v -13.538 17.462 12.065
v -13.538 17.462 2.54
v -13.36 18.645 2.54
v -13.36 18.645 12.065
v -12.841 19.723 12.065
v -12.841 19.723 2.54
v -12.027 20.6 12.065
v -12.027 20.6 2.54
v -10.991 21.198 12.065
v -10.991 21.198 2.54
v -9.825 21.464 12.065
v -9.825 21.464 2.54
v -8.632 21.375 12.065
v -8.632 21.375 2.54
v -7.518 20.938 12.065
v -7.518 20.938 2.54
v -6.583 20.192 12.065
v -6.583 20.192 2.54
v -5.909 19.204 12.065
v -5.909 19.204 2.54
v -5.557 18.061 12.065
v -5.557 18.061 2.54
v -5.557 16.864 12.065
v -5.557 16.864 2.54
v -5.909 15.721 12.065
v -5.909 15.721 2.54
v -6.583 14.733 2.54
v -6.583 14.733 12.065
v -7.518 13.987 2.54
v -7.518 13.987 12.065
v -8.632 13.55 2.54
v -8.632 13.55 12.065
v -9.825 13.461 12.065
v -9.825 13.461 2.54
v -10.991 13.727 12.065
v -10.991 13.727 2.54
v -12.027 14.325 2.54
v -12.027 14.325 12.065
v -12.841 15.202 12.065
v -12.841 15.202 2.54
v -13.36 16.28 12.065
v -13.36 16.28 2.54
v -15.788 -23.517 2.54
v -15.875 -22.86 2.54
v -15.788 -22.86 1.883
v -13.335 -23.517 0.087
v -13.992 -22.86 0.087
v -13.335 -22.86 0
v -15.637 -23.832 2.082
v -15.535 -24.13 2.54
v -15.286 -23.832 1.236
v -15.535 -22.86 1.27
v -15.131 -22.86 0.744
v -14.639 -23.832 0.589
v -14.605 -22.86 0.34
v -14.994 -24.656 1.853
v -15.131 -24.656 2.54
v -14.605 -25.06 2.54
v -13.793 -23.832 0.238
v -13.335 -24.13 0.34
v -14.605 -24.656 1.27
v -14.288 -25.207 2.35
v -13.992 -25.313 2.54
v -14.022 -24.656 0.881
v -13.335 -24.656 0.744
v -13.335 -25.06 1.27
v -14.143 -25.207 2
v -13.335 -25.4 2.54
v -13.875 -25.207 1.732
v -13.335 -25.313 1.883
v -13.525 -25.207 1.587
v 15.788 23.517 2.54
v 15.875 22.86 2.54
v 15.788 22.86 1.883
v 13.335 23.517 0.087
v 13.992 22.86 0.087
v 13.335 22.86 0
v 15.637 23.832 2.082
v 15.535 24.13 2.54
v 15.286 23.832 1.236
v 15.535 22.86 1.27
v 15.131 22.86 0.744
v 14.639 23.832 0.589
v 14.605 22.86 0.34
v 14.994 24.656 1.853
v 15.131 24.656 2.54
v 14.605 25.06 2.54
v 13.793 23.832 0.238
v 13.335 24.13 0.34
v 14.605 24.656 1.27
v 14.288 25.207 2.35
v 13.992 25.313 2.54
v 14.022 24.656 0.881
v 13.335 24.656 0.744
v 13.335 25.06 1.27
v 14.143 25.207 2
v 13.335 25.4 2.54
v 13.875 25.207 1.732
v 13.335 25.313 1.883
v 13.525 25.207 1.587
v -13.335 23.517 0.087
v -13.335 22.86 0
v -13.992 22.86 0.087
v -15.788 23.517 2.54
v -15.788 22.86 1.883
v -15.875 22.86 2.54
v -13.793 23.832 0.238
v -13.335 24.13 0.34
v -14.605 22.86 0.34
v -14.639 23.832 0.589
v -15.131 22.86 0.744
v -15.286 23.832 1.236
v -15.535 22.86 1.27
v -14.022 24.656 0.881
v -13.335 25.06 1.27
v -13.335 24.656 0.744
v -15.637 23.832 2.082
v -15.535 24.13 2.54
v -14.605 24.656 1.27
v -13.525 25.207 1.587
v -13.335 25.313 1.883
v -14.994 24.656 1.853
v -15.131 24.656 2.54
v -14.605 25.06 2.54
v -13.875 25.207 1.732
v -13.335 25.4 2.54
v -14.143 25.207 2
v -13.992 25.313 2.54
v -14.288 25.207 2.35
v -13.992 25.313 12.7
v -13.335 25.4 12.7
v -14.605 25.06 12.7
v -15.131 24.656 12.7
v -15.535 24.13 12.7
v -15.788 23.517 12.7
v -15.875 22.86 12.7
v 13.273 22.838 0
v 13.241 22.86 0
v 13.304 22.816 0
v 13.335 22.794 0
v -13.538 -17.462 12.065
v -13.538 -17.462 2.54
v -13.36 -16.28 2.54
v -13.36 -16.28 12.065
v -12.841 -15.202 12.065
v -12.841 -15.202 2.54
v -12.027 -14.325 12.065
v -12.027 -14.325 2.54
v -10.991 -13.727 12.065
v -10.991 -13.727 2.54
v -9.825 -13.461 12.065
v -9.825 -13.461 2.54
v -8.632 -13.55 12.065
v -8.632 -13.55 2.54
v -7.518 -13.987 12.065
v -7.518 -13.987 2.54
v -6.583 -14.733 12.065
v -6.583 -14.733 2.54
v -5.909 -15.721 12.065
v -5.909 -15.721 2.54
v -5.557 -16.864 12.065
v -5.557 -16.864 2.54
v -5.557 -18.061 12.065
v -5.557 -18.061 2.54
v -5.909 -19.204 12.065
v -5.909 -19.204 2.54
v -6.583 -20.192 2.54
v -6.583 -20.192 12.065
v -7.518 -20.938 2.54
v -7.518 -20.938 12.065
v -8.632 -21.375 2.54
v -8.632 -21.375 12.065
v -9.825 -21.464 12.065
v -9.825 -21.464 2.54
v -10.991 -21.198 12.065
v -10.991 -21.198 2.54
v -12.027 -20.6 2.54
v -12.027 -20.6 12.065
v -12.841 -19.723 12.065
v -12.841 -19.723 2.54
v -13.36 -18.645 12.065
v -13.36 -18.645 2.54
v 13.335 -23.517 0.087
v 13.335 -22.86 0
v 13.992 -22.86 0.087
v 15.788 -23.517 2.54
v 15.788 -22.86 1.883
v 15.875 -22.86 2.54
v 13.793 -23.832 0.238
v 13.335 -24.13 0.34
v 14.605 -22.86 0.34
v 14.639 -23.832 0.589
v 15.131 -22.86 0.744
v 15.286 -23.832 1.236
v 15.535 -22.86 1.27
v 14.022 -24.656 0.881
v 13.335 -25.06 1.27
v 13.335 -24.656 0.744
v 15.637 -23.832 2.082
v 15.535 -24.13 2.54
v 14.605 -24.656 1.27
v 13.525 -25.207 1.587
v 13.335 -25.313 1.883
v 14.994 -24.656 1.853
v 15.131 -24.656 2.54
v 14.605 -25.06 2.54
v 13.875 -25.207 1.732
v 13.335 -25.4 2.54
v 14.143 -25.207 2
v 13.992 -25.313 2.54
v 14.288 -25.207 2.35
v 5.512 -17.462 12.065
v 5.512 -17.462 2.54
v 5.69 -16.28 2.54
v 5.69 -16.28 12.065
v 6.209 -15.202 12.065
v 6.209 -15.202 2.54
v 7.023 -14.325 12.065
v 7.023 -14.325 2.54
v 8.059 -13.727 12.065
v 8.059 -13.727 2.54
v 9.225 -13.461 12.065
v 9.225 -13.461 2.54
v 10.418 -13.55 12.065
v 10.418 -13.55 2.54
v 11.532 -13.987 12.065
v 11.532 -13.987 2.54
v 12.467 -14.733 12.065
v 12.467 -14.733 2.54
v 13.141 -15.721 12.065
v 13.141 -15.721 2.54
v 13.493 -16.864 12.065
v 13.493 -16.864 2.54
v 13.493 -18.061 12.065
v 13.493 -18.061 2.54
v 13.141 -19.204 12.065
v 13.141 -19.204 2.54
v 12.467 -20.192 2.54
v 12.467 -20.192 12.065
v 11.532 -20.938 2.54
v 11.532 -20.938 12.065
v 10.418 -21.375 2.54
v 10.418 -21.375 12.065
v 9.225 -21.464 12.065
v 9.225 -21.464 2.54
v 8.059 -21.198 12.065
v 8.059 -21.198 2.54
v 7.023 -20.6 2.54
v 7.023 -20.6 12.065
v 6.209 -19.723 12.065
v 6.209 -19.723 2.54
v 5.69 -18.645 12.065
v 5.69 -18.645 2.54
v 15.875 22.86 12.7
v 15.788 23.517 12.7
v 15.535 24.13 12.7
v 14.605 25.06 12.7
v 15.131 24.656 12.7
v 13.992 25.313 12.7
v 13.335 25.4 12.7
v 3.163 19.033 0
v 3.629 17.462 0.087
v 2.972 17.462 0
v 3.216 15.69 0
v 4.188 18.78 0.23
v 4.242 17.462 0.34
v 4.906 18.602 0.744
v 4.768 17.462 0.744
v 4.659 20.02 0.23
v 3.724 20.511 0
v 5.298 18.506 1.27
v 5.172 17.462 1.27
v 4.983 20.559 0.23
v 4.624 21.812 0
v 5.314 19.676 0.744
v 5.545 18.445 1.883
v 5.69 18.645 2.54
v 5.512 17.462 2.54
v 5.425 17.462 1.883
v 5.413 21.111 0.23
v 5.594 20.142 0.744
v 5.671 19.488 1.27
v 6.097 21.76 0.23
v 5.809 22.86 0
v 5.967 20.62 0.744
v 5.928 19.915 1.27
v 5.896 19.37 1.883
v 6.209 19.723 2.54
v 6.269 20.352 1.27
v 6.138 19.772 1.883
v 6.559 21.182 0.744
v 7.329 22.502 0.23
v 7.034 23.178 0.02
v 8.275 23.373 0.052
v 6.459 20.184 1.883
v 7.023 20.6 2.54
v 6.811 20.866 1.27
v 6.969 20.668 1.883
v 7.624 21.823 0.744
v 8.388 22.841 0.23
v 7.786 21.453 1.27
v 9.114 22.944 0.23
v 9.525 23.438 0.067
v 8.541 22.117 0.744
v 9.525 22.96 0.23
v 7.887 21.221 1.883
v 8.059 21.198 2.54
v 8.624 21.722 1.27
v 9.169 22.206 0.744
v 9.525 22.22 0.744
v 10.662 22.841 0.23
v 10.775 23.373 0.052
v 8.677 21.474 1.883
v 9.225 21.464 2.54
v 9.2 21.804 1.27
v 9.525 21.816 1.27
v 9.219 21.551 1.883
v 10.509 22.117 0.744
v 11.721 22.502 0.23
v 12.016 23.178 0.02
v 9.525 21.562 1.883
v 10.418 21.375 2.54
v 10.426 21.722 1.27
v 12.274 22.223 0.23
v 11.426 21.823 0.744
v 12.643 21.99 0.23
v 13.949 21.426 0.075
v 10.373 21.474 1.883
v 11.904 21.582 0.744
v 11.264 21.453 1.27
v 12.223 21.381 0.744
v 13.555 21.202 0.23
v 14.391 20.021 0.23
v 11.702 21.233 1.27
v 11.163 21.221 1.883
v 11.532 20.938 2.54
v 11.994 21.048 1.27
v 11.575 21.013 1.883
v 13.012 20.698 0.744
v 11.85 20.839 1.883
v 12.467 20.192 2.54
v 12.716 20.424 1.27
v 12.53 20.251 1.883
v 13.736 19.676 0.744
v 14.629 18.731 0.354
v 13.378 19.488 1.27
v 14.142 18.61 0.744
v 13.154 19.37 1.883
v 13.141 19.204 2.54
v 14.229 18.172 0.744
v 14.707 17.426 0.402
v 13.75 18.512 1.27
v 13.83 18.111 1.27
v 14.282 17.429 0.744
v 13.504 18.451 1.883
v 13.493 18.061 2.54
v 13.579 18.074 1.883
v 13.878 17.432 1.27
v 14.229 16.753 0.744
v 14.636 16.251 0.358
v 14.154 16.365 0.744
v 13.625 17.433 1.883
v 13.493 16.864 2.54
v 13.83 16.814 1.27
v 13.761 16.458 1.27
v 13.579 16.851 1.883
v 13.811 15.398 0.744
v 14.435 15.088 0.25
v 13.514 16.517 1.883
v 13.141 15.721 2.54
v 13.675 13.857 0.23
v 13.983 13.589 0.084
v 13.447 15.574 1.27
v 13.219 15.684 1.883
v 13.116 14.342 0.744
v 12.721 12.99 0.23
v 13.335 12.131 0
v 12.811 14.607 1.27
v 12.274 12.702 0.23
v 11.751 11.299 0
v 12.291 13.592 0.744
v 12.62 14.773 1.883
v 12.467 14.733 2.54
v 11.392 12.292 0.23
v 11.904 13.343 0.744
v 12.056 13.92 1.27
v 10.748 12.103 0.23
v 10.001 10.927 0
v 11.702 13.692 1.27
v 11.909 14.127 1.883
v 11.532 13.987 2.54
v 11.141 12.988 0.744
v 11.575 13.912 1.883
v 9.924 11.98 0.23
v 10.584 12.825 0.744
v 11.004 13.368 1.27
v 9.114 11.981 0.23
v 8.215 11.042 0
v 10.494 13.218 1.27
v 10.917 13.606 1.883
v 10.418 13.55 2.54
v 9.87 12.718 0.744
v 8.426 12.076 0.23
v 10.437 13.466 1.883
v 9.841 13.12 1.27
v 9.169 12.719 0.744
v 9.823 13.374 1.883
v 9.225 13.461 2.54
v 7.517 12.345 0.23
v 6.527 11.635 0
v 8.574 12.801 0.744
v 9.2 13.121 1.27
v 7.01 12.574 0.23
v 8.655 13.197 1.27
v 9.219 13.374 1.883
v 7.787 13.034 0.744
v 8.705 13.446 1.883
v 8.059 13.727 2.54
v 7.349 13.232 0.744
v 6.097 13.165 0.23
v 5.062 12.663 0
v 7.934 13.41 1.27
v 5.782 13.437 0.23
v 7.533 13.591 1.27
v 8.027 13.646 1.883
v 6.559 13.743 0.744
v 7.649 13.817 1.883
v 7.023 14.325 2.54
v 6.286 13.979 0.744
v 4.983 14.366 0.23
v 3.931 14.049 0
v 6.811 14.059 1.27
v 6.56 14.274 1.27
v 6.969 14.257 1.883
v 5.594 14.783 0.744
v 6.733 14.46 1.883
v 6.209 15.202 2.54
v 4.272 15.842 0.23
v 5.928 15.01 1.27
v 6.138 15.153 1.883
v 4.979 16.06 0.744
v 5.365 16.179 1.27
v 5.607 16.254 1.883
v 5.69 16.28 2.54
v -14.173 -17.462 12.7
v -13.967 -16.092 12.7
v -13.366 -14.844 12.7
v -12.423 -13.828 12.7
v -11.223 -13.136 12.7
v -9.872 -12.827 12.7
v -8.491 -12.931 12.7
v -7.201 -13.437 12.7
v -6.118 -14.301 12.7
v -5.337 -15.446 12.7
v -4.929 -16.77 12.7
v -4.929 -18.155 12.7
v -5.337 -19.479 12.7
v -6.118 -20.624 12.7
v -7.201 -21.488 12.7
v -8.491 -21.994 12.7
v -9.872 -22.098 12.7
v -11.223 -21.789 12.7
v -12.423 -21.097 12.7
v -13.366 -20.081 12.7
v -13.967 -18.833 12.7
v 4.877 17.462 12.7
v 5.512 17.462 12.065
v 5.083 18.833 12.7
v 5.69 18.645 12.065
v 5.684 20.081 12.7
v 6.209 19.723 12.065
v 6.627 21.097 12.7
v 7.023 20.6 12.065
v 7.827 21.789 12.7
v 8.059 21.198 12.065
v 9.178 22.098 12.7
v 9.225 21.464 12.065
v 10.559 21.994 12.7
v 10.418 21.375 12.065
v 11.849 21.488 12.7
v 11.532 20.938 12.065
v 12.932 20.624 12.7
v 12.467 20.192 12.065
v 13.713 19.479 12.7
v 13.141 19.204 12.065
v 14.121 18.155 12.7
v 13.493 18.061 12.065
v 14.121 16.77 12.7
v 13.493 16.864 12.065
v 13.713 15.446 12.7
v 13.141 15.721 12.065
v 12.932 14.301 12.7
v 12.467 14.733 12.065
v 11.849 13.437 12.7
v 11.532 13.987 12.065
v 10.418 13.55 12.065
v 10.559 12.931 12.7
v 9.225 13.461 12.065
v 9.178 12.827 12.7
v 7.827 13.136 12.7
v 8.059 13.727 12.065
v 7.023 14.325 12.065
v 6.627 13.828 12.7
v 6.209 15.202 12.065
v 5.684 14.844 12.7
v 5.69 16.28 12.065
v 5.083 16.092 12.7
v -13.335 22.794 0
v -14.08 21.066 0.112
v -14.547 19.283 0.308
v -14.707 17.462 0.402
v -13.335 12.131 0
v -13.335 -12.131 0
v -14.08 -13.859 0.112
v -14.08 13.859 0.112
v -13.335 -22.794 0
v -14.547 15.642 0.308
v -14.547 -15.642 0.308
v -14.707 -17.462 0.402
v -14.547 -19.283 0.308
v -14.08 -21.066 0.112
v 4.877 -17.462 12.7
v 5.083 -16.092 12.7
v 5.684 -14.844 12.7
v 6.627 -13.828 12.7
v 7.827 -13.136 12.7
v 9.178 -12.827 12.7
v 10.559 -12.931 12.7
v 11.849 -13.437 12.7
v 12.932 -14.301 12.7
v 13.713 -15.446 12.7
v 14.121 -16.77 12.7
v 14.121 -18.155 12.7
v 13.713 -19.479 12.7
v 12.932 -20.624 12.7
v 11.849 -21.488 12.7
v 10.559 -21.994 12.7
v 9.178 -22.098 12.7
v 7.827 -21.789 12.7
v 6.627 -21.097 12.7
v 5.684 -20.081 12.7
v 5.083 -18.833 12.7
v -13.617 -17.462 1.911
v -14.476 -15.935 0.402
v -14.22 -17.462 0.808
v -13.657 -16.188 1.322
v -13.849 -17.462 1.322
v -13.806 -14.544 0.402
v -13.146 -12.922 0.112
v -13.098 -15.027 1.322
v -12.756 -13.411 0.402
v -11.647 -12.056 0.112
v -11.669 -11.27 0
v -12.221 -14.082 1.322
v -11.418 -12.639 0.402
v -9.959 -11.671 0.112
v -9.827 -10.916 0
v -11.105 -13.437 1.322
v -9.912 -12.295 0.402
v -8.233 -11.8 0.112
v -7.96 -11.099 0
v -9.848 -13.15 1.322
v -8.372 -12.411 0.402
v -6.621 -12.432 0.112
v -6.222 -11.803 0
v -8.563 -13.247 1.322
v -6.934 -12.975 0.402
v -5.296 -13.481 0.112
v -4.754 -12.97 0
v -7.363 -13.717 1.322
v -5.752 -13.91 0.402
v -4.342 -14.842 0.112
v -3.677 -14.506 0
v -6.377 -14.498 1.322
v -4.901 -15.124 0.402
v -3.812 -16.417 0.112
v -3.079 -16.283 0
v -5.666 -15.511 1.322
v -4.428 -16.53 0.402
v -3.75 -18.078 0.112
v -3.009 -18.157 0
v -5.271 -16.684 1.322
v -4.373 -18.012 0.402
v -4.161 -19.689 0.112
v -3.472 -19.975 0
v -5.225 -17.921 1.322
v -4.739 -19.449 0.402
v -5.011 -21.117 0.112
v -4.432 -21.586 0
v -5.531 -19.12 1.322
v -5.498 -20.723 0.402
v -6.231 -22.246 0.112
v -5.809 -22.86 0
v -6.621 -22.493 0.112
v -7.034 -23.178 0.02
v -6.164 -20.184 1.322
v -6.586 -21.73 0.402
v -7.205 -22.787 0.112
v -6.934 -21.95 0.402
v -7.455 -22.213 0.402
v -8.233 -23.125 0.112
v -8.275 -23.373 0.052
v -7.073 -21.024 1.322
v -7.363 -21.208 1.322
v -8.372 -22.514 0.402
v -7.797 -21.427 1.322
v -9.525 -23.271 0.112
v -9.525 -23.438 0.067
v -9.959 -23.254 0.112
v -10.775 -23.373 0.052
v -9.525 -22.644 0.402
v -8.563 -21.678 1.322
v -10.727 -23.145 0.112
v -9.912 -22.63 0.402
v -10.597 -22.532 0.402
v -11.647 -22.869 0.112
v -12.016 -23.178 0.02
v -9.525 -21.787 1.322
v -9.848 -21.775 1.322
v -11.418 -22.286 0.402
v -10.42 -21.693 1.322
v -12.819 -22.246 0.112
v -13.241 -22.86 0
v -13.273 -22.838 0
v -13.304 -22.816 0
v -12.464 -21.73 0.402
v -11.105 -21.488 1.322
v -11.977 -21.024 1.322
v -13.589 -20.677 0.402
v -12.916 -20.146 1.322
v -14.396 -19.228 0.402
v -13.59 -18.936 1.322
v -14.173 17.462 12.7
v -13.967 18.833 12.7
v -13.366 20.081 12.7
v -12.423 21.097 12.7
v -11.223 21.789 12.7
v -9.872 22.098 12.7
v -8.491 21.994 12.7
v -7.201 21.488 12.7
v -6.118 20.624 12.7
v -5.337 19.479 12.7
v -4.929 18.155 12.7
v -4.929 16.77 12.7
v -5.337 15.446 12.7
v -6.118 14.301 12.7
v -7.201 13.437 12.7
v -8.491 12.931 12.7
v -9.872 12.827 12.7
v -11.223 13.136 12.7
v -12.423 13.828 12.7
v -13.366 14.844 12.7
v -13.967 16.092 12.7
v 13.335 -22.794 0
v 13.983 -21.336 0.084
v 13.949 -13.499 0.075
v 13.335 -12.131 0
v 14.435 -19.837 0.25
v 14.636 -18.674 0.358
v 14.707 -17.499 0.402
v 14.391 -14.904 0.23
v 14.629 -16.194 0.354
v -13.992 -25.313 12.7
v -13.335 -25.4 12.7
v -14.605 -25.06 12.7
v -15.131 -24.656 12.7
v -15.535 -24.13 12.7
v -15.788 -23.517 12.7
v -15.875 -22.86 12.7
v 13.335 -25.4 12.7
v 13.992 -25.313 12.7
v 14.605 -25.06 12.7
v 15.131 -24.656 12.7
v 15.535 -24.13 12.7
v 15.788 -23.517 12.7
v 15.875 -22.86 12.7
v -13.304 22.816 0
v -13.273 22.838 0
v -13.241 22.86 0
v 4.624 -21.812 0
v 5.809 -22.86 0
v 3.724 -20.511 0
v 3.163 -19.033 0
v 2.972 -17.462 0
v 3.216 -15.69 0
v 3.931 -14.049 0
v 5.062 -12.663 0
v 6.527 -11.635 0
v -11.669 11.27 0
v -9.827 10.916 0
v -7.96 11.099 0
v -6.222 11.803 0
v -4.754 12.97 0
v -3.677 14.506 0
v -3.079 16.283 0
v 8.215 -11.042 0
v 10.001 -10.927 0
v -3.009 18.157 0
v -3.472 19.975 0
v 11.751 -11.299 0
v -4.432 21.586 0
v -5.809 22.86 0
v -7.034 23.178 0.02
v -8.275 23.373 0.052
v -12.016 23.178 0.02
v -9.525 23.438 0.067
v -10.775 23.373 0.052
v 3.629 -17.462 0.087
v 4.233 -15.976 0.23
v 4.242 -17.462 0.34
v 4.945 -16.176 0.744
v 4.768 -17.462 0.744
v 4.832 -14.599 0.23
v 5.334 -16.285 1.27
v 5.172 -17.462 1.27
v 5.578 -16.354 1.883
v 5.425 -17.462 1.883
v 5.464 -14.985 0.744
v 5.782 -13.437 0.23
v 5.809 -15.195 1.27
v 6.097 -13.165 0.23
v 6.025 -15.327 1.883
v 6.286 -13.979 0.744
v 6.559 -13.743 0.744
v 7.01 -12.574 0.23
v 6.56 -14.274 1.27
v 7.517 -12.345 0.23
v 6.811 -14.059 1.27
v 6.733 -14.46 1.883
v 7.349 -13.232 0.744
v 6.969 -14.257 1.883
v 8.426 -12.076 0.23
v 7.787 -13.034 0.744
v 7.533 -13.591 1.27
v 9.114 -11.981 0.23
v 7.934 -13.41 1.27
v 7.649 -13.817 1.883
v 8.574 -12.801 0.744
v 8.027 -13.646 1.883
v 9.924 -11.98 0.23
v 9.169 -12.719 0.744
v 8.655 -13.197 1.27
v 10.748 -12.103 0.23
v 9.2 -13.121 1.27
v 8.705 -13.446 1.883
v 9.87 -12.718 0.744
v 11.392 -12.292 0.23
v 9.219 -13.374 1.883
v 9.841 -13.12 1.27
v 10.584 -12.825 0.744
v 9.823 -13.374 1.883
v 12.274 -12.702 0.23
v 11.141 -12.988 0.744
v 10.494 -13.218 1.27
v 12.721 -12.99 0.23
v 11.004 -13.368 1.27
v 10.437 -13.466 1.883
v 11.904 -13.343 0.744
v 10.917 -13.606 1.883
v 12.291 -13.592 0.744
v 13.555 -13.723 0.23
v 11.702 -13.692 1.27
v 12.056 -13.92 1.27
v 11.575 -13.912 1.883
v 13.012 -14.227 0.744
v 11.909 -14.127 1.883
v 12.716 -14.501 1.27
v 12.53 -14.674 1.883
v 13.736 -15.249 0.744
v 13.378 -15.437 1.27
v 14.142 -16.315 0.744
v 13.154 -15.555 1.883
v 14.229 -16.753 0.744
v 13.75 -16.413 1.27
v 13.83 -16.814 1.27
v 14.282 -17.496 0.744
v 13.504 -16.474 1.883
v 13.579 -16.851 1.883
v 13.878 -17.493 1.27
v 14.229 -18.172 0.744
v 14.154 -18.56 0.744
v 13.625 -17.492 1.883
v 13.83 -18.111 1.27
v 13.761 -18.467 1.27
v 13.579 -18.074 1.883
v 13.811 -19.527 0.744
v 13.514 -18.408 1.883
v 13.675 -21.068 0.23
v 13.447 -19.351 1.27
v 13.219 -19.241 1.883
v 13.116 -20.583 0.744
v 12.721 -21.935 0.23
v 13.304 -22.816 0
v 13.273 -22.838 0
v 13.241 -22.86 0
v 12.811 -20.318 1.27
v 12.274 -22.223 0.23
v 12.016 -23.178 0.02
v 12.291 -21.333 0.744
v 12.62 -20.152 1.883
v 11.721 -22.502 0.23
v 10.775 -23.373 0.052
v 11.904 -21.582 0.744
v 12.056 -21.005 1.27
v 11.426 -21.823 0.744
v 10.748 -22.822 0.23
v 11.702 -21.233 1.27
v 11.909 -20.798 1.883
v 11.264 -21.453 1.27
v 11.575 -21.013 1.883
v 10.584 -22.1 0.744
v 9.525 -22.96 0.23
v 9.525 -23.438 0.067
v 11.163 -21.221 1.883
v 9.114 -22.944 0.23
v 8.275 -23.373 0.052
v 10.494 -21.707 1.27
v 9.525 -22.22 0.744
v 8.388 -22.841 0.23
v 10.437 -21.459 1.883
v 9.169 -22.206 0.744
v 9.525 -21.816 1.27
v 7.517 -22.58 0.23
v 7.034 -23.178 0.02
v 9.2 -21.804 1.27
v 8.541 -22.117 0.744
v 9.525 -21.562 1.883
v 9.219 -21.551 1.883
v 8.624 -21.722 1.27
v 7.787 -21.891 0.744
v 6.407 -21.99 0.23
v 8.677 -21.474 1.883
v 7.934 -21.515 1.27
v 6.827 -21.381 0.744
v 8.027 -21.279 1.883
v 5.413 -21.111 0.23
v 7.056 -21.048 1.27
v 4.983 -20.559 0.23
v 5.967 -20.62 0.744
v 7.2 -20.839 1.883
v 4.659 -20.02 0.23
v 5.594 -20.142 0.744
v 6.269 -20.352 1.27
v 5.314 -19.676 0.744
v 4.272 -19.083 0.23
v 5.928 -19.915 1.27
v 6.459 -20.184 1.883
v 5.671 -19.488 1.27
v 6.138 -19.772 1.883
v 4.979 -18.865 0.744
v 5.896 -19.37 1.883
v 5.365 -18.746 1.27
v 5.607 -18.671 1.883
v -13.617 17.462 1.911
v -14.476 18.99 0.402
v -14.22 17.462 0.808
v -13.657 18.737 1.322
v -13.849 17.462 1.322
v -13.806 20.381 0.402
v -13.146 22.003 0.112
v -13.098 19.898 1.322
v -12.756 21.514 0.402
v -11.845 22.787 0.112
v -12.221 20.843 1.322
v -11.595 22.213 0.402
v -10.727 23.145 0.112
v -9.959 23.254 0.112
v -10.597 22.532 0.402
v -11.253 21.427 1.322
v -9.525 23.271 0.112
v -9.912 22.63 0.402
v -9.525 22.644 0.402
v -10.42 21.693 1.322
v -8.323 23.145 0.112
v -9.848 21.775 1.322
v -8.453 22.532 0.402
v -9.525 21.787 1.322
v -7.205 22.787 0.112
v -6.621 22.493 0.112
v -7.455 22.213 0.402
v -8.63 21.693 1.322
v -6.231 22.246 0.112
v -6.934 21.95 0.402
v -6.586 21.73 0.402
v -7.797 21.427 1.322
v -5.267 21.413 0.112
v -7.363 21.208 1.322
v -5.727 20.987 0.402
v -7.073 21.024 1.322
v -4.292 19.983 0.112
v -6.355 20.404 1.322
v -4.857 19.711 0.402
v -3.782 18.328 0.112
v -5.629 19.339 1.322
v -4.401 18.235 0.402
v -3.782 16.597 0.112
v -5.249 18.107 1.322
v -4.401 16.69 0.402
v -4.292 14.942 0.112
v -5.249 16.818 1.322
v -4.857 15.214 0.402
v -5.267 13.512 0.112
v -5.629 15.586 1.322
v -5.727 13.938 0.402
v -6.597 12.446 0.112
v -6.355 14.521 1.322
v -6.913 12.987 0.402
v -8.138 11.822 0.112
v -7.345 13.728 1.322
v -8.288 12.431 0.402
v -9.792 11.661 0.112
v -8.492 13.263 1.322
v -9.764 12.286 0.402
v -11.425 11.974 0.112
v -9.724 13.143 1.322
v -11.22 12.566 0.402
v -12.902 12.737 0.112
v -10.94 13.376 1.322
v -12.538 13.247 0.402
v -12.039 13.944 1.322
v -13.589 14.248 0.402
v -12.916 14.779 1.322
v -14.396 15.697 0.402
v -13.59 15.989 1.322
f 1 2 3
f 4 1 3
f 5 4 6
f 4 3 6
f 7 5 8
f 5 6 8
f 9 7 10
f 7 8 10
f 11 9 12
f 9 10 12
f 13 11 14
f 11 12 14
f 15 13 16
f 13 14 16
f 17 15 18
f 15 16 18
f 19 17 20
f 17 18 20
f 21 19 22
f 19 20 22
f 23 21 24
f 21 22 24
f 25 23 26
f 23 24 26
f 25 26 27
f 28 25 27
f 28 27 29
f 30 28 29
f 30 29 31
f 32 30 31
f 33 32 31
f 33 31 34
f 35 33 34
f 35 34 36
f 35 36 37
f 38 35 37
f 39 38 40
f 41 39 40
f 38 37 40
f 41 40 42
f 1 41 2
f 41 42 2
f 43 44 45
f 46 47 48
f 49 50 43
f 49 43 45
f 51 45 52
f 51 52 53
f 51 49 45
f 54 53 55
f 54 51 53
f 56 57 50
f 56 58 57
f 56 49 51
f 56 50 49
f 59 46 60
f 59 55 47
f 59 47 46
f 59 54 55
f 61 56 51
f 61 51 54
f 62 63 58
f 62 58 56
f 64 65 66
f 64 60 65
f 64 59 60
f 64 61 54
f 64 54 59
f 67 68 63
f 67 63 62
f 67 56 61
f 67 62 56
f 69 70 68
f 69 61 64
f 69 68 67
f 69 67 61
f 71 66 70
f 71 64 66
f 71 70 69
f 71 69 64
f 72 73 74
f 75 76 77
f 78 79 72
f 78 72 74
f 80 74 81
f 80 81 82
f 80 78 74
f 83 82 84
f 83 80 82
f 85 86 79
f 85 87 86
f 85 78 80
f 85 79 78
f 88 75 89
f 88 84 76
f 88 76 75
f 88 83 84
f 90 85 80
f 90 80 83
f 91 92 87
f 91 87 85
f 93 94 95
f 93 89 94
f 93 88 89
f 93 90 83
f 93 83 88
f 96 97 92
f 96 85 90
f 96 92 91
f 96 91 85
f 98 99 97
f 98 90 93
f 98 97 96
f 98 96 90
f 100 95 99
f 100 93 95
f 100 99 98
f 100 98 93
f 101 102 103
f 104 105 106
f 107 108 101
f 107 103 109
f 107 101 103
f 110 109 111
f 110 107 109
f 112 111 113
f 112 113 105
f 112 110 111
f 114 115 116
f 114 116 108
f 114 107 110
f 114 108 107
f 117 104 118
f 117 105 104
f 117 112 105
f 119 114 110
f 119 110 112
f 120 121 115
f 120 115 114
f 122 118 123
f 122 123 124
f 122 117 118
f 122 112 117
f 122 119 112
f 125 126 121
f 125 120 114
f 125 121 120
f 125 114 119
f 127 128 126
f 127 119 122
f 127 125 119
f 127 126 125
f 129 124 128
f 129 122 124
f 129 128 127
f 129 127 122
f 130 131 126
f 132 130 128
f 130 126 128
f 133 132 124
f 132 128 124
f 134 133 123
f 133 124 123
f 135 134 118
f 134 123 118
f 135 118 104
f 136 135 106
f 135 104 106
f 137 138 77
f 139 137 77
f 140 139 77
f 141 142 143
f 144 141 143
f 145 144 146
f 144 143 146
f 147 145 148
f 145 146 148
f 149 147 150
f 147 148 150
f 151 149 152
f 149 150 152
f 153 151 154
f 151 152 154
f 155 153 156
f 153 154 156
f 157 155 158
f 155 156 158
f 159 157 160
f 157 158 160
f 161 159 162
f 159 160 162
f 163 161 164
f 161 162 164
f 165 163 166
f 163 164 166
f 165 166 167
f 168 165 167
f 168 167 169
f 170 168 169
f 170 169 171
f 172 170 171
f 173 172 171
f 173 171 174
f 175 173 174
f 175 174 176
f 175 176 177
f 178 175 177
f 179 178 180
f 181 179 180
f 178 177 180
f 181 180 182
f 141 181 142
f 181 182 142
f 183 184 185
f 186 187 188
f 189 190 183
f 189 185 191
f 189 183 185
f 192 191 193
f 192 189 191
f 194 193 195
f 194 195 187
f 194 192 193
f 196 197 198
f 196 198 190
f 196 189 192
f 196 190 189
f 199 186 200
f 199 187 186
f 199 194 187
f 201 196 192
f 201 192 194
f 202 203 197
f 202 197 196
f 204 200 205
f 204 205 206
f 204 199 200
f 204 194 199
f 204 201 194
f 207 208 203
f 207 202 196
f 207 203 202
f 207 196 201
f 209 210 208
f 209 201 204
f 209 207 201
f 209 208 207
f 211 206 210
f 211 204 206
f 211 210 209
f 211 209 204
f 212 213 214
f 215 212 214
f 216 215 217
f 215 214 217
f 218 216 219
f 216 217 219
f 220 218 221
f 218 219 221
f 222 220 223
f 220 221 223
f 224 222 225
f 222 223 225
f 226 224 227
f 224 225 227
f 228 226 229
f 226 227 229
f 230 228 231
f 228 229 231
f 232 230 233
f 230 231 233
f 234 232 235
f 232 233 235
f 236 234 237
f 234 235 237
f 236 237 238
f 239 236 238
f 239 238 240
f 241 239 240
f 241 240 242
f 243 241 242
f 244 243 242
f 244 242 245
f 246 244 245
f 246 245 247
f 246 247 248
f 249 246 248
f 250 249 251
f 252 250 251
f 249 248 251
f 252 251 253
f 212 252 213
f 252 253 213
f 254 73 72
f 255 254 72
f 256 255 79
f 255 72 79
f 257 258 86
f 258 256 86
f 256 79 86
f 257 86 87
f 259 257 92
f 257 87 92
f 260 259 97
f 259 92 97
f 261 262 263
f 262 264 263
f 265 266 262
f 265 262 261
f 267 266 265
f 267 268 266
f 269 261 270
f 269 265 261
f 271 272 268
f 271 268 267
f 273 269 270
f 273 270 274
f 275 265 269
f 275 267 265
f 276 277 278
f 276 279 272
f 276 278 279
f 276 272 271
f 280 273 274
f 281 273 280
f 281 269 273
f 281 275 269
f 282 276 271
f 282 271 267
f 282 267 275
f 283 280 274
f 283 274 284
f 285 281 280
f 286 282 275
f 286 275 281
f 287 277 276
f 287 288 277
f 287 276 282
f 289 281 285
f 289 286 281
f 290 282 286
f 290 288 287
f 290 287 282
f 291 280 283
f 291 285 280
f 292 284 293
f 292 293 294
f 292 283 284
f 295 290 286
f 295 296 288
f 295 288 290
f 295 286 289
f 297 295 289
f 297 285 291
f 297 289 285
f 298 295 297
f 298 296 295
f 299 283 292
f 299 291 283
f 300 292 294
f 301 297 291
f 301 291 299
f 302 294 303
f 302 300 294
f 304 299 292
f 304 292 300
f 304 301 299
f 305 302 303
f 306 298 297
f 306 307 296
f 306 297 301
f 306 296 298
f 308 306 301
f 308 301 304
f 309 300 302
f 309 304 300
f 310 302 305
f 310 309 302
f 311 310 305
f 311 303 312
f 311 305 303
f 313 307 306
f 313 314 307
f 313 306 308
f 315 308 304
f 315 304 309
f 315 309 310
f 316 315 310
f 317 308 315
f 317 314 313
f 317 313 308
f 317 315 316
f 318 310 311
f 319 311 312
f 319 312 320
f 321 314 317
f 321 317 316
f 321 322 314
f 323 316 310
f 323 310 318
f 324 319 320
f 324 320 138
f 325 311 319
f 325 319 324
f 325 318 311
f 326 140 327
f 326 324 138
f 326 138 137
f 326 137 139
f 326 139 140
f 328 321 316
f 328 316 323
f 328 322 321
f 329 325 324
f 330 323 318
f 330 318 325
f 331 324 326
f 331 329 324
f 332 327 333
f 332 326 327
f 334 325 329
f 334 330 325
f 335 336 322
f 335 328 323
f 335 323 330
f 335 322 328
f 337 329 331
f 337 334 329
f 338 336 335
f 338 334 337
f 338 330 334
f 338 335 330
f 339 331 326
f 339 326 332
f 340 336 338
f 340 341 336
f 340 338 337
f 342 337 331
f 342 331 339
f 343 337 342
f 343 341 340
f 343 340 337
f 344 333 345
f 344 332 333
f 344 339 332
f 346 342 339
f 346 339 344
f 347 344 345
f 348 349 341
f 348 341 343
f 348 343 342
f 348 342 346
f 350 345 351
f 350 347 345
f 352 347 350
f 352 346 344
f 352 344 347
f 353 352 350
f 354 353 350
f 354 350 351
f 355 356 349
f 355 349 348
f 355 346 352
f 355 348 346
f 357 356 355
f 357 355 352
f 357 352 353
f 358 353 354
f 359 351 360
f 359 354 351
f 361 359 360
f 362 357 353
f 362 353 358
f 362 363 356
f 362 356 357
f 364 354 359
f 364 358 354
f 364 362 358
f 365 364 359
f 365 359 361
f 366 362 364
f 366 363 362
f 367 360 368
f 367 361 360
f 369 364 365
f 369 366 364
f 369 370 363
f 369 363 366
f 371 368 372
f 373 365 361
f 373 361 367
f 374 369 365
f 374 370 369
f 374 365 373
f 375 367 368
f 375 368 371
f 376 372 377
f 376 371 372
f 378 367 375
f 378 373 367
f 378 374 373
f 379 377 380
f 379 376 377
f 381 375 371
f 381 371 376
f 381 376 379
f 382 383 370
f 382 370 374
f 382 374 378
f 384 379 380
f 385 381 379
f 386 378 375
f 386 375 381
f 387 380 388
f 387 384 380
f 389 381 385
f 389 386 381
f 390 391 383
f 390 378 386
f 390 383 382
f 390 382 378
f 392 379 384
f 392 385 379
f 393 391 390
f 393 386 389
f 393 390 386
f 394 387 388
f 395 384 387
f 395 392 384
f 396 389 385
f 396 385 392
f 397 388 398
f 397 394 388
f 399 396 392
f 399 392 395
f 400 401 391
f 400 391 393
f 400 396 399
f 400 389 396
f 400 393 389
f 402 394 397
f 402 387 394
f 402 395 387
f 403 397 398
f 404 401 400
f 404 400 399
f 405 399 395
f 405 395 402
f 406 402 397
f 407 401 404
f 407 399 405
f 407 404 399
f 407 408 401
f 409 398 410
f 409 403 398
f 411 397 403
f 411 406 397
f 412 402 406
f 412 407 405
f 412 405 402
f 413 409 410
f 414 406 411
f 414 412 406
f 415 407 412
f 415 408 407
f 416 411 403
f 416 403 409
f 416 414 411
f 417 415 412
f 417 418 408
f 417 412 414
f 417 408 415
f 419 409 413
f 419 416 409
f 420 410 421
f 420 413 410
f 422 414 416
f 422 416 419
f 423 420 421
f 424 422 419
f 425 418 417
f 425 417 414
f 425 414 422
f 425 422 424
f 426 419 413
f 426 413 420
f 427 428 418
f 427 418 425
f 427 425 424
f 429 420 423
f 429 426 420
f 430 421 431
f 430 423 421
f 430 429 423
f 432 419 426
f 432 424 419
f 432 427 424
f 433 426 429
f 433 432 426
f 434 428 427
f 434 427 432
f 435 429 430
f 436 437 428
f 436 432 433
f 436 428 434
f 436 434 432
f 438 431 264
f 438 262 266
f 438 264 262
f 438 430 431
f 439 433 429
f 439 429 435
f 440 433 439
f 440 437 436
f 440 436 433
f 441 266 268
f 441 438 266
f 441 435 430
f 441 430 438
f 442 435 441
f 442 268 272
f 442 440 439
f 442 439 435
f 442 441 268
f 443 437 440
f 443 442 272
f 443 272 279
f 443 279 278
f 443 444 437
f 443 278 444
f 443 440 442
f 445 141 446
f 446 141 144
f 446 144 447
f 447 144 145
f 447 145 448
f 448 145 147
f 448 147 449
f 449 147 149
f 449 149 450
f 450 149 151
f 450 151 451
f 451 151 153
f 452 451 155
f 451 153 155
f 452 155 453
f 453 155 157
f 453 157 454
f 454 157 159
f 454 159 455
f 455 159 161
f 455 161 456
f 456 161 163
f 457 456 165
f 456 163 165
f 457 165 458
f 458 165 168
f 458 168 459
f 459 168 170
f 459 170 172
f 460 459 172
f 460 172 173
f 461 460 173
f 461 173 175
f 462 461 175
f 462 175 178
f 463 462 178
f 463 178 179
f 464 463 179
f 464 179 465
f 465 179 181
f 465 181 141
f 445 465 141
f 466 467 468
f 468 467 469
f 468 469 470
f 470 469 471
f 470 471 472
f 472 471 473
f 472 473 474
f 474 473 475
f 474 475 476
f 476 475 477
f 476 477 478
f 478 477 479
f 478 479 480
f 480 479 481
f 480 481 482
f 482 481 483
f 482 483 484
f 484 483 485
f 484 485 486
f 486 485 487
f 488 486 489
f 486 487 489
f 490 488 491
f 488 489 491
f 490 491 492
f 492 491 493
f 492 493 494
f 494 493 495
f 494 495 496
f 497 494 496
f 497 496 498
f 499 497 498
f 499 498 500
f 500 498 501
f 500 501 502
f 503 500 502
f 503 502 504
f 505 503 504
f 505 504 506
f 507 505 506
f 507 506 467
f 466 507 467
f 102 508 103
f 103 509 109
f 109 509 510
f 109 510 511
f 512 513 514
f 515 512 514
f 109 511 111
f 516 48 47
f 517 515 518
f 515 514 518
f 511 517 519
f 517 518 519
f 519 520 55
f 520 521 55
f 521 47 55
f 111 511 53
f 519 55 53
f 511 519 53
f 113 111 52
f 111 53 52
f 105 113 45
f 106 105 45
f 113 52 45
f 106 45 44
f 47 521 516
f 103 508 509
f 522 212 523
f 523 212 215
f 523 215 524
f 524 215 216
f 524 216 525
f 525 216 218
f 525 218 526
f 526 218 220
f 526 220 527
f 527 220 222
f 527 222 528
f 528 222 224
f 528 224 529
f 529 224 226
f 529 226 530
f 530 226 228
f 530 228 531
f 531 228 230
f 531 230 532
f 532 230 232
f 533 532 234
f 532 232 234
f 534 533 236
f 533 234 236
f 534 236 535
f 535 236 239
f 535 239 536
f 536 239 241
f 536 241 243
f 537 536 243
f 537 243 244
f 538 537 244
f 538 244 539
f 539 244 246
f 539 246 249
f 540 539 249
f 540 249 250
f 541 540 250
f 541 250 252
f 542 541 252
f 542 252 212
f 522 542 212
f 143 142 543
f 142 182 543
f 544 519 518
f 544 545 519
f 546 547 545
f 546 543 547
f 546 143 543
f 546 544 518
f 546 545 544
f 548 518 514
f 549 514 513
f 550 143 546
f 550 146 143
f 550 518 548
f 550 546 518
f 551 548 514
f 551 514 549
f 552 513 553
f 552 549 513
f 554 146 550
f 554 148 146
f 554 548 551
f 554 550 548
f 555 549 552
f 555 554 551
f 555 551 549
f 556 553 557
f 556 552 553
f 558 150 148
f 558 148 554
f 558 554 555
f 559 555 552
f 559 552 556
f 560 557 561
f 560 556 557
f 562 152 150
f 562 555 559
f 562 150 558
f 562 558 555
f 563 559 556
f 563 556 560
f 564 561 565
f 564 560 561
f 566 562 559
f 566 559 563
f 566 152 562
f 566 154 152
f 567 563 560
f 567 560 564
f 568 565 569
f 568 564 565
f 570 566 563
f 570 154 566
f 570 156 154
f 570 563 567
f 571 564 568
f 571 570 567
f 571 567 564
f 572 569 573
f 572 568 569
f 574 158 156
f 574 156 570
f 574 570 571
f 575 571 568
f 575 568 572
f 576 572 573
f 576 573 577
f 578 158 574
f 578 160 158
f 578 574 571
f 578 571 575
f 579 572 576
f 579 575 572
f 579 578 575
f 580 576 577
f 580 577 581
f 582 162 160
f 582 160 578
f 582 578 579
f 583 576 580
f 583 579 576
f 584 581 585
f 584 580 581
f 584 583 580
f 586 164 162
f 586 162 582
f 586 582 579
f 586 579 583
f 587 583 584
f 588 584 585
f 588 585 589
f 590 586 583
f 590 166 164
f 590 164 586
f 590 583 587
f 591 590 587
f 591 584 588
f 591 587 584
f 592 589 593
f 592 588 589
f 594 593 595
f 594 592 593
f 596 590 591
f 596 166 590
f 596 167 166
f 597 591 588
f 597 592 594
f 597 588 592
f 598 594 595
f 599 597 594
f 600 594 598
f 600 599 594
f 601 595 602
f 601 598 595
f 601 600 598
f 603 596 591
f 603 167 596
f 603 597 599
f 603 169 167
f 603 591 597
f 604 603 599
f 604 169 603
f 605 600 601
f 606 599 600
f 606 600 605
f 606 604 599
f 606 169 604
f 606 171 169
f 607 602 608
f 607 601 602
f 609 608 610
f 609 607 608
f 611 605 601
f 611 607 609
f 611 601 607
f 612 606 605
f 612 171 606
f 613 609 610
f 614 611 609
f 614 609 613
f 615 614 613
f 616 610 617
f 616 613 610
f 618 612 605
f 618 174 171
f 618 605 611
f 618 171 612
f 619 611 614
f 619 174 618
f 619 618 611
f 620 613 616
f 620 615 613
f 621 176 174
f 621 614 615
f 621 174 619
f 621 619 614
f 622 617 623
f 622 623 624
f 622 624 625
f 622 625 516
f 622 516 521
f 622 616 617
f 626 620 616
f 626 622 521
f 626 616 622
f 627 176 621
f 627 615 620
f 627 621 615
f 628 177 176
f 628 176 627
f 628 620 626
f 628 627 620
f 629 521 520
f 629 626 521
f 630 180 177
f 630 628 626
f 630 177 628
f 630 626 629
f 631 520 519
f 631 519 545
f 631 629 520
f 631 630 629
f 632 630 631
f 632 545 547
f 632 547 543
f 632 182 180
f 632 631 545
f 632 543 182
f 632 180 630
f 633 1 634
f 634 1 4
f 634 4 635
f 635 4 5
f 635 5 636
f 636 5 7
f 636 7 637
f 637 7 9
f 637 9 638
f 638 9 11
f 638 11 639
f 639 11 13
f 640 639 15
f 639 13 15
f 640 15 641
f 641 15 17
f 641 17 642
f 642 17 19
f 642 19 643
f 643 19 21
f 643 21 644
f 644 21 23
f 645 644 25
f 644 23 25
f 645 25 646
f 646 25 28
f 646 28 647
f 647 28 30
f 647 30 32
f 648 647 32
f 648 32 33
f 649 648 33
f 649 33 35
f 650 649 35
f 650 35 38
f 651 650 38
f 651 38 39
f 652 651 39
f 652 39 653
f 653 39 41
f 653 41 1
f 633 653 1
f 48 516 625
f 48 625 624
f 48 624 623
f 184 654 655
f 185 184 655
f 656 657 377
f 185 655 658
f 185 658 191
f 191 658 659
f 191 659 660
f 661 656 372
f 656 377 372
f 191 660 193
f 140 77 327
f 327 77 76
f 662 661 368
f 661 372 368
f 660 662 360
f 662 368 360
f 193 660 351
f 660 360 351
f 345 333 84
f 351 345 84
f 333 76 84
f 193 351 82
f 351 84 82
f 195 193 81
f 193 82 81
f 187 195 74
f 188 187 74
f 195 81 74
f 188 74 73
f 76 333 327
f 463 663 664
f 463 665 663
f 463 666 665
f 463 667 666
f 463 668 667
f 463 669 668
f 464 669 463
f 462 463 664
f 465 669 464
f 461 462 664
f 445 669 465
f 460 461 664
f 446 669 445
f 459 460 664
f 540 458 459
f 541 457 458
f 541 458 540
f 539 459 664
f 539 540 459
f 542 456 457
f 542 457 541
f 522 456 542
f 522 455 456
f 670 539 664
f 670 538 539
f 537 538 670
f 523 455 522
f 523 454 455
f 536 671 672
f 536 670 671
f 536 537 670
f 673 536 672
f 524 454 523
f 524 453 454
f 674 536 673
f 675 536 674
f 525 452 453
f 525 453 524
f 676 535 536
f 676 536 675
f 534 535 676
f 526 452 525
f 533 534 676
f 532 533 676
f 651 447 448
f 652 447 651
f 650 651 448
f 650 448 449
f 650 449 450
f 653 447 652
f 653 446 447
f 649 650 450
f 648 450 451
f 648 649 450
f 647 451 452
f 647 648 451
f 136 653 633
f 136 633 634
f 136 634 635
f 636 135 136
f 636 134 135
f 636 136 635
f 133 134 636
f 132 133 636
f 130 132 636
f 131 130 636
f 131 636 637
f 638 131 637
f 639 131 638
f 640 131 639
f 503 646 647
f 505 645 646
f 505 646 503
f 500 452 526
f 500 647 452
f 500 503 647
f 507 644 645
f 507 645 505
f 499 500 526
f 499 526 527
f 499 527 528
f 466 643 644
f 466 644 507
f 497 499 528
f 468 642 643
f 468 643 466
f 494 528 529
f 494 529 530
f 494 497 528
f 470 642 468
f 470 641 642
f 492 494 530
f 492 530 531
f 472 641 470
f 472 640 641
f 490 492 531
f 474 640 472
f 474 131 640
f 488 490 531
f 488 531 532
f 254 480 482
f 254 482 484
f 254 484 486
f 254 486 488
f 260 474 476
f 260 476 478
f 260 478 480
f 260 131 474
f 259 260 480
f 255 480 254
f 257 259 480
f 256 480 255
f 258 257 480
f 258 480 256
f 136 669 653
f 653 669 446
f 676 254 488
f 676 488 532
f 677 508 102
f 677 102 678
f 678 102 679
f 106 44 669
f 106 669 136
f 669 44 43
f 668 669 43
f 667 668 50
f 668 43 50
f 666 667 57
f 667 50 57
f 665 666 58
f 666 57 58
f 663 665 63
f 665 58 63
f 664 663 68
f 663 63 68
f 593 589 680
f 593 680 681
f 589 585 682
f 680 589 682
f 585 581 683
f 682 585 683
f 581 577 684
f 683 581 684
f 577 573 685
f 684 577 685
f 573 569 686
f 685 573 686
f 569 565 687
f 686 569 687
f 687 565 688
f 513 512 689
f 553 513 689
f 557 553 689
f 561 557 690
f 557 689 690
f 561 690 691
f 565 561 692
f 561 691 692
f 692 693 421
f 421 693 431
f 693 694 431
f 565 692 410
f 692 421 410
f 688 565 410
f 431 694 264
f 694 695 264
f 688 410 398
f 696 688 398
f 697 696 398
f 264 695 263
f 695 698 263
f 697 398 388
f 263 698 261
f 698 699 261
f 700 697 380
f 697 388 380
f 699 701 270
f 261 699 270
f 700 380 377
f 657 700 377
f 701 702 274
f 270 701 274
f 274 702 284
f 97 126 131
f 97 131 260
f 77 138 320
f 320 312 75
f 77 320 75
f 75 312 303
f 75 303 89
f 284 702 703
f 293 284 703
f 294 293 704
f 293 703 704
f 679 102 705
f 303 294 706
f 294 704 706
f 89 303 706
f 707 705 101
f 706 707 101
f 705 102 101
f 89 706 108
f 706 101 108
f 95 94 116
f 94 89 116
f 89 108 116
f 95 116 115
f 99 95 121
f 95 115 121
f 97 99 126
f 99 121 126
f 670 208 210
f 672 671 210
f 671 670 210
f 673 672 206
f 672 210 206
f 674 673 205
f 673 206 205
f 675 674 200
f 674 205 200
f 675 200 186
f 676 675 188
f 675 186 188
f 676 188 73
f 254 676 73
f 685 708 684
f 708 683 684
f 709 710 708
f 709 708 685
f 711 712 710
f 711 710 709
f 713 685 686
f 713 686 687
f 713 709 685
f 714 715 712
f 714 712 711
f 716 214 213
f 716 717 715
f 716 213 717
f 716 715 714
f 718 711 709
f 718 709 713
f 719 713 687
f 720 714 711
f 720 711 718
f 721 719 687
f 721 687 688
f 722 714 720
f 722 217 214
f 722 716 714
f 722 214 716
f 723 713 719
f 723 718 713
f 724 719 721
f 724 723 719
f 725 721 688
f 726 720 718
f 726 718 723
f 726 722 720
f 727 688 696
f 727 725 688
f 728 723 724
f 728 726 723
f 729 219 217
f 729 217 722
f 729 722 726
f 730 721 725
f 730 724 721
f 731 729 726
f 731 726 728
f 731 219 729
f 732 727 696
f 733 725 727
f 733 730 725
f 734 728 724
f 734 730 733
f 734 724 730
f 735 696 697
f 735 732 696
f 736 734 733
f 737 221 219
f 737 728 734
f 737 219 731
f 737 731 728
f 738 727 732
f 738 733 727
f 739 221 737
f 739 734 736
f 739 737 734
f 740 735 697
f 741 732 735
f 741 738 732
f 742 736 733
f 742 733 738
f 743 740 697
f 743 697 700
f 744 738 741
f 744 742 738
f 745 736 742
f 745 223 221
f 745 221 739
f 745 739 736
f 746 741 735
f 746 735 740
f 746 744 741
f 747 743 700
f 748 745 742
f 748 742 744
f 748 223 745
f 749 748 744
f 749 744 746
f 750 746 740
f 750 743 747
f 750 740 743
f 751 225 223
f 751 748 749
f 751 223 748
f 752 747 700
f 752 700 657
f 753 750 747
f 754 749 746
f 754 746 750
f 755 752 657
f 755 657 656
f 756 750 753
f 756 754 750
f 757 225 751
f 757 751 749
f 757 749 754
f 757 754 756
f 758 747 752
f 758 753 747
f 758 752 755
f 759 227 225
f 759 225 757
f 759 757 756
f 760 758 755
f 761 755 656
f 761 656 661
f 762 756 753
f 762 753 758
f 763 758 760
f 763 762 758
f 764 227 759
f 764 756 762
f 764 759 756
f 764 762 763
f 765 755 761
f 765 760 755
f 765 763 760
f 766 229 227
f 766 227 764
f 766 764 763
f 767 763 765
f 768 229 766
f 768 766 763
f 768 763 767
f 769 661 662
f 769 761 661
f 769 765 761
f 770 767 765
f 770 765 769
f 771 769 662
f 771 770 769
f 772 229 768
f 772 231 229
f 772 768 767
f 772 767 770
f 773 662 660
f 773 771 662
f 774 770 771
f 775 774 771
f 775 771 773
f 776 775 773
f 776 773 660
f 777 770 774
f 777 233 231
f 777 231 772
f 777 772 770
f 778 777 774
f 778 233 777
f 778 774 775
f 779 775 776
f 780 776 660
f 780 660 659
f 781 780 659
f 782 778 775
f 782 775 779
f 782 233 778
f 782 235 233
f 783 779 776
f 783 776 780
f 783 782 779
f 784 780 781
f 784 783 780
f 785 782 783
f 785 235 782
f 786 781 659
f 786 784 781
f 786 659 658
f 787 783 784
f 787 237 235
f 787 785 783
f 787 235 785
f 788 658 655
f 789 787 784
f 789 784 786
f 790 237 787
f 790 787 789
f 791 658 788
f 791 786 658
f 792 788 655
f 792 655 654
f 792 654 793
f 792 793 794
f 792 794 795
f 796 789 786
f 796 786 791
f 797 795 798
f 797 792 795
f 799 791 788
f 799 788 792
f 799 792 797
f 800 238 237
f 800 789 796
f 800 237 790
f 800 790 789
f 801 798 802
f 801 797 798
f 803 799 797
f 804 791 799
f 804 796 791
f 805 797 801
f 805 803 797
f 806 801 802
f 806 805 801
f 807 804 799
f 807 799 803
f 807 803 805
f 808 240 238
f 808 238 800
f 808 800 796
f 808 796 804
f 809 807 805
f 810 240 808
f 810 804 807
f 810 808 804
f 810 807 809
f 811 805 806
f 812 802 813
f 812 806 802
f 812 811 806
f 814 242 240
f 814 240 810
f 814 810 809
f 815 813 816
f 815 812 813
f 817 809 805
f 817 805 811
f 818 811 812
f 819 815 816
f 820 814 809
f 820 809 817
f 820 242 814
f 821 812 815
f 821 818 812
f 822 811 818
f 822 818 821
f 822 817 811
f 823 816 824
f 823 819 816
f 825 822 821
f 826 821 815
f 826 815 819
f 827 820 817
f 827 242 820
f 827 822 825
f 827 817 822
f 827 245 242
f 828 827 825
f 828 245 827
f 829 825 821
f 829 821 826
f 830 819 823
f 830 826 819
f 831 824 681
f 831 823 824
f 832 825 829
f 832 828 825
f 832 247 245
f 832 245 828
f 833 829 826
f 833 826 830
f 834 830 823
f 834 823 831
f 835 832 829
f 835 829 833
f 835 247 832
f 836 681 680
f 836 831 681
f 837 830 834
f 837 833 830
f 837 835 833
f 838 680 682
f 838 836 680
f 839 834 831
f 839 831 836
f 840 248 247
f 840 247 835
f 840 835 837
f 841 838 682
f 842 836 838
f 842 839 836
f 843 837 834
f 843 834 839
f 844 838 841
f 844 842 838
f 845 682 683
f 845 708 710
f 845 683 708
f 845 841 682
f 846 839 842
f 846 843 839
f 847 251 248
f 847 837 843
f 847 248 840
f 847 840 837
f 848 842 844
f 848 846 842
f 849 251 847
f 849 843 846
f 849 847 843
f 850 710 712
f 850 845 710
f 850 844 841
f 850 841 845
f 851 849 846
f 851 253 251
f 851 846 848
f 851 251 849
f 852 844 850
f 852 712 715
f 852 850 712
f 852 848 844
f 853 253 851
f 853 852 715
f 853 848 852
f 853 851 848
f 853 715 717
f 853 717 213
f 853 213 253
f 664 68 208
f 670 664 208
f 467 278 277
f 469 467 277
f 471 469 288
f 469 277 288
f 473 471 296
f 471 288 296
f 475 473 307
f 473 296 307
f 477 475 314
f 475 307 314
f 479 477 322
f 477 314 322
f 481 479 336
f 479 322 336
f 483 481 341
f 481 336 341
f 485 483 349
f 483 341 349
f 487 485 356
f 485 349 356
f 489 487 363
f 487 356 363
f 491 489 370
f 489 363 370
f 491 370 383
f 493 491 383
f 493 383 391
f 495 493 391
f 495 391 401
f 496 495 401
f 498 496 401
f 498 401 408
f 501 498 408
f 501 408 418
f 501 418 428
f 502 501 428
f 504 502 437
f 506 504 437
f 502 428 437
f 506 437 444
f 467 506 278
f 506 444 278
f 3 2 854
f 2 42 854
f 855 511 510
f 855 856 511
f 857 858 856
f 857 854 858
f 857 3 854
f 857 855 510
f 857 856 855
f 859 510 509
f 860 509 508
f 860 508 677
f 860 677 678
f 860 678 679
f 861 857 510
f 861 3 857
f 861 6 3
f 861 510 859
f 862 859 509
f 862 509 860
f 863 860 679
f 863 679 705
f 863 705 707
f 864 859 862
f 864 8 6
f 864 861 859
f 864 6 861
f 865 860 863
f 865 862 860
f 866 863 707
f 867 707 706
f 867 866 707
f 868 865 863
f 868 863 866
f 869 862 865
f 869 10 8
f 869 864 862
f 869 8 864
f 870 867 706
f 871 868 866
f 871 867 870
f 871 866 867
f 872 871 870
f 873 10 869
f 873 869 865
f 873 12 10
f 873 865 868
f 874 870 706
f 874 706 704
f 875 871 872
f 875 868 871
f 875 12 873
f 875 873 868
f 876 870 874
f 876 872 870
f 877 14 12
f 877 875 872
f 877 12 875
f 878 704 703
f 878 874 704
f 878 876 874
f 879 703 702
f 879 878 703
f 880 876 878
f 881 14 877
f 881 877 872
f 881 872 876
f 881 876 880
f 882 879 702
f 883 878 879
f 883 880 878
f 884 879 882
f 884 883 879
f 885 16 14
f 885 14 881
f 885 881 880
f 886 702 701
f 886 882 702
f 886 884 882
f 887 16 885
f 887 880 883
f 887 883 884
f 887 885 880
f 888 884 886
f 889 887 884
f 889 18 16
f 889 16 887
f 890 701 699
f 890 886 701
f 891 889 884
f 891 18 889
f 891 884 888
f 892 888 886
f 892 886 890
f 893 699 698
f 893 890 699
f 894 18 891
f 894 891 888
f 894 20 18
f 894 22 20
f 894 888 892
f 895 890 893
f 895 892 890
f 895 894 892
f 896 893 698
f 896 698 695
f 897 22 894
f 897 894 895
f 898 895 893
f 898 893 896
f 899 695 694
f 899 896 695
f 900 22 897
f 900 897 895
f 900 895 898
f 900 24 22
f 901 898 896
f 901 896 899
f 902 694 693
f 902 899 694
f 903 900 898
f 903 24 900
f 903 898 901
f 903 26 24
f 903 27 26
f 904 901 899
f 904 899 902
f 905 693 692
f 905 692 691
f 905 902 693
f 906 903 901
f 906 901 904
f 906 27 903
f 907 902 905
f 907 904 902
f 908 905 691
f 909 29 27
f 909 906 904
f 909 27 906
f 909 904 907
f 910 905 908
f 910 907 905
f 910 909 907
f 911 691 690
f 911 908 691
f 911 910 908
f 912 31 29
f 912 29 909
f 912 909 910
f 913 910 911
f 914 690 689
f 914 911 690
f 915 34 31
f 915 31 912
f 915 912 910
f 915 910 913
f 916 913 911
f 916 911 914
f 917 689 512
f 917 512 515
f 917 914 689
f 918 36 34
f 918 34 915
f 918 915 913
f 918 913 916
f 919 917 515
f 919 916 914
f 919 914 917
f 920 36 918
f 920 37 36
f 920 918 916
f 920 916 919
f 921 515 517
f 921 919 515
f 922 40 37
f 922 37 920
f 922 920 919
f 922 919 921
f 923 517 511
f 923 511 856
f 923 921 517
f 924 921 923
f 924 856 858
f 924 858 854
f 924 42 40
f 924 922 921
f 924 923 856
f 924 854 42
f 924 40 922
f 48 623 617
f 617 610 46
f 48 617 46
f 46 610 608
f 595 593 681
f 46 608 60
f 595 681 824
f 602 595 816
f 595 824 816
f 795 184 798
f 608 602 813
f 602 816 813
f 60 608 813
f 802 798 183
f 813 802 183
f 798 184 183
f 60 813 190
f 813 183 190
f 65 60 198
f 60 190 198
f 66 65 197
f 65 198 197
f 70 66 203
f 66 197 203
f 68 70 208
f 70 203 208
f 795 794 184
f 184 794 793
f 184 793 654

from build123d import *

# Parameters (mm, degrees)
SKETCH1_W                          = 31.75
SKETCH1_H                          = 50.8
BOSS_EXTRUDE1_DEPTH                = 12.7
O_0_316_DIAMETER_HOLE1_D           = 8.0264
O_0_316_DIAMETER_HOLE1_CSINK_D     = 9.2964
O_0_316_DIAMETER_HOLE1_CSINK_ANGLE = 90
FILLET1_R                          = 2.54


with BuildPart() as part:
    # Sketch1 → Boss-Extrude1 (new body)
    with BuildSketch(Plane.XY):
        Rectangle(SKETCH1_W, SKETCH1_H)
    extrude(amount=BOSS_EXTRUDE1_DEPTH)

    # O (0.316) Diameter Hole1 (through all)
    with Locations(Plane.XY.offset(12.7)):
        with Locations((-9.525, 17.4625), (9.525, 17.4625), (9.525, -17.4625), (-9.525, -17.4625)):
            CounterSinkHole(O_0_316_DIAMETER_HOLE1_D / 2, O_0_316_DIAMETER_HOLE1_CSINK_D / 2, counter_sink_angle=O_0_316_DIAMETER_HOLE1_CSINK_ANGLE)

    # Fillet1
    # the kernel refuses this fillet: 2.54 mm, written as the material it takes off along each edge
    with BuildSketch(Plane(origin=(13.335, -22.86, 2.54), x_dir=(0, 0, -1), z_dir=(0, -1, 0))) as fillet1_piece_1_section:
        Polygon((0, 0), (FILLET1_R, 0), (FILLET1_R, FILLET1_R), (0, FILLET1_R), align=None)
    fillet1_piece_1 = extrude(amount=FILLET1_R, mode=Mode.PRIVATE)
    fillet1_piece_1 = fillet1_piece_1 - Plane(origin=(13.335, -22.86, 2.54), x_dir=(-0.7071067811865475, 0, 0.7071067811865475), z_dir=(0, -1, 0)) * Sphere(FILLET1_R, mode=Mode.PRIVATE)
    add(fillet1_piece_1, mode=Mode.SUBTRACT)
    with BuildSketch(Plane(origin=(-13.335, -22.86, 2.54), x_dir=(0, 0, -1), z_dir=(0, -1, 0))) as fillet1_piece_2_section:
        Polygon((0, 0), (FILLET1_R, 0), (FILLET1_R, -FILLET1_R), (0, -FILLET1_R), align=None)
    fillet1_piece_2 = extrude(amount=FILLET1_R, mode=Mode.PRIVATE)
    fillet1_piece_2 = fillet1_piece_2 - Plane(origin=(-13.335, -22.86, 2.54), x_dir=(0.7071067811865475, 0, 0.7071067811865475), z_dir=(0, -1, 0)) * Sphere(FILLET1_R, mode=Mode.PRIVATE)
    add(fillet1_piece_2, mode=Mode.SUBTRACT)
    with BuildSketch(Plane(origin=(-13.335, 22.86, 2.54), x_dir=(0, 0, -1), z_dir=(0, 1, 0))) as fillet1_piece_3_section:
        Polygon((0, 0), (FILLET1_R, 0), (FILLET1_R, FILLET1_R), (0, FILLET1_R), align=None)
    fillet1_piece_3 = extrude(amount=FILLET1_R, mode=Mode.PRIVATE)
    fillet1_piece_3 = fillet1_piece_3 - Plane(origin=(-13.335, 22.86, 2.54), x_dir=(0.7071067811865475, 0, 0.7071067811865475), z_dir=(0, 1, 0)) * Sphere(FILLET1_R, mode=Mode.PRIVATE)
    add(fillet1_piece_3, mode=Mode.SUBTRACT)
    with BuildSketch(Plane(origin=(13.335, 22.86, 2.54), x_dir=(0, 0, -1), z_dir=(0, 1, 0))) as fillet1_piece_4_section:
        Polygon((0, 0), (FILLET1_R, 0), (FILLET1_R, -FILLET1_R), (0, -FILLET1_R), align=None)
    fillet1_piece_4 = extrude(amount=FILLET1_R, mode=Mode.PRIVATE)
    fillet1_piece_4 = fillet1_piece_4 - Plane(origin=(13.335, 22.86, 2.54), x_dir=(-0.7071067811865475, 0, 0.7071067811865475), z_dir=(0, 1, 0)) * Sphere(FILLET1_R, mode=Mode.PRIVATE)
    add(fillet1_piece_4, mode=Mode.SUBTRACT)
    with BuildSketch(Plane(origin=(-9.525, -17.4625, 0), x_dir=(-1, 0, 0), z_dir=(0, -1, 0))) as fillet1_piece_5:
        with BuildLine():
            CenterArc((4.0132 + FILLET1_R, -FILLET1_R), FILLET1_R, 90, 90)
            Line((4.0132 + FILLET1_R, 0), (4.0132, 0))
            Line((4.0132, 0), (4.0132, -FILLET1_R))
        make_face()
    revolve(axis=Axis((-9.525, -17.4625, 0), (0, 0, -1)), mode=Mode.SUBTRACT)
    with BuildSketch(Plane(origin=(9.525, -17.4625, 0), x_dir=(-1, 0, 0), z_dir=(0, -1, 0))) as fillet1_piece_6:
        with BuildLine():
            CenterArc((4.0132 + FILLET1_R, -FILLET1_R), FILLET1_R, 90, 90)
            Line((4.0132 + FILLET1_R, 0), (4.0132, 0))
            Line((4.0132, 0), (4.0132, -FILLET1_R))
        make_face()
    revolve(axis=Axis((9.525, -17.4625, 0), (0, 0, -1)), mode=Mode.SUBTRACT)
    with BuildSketch(Plane(origin=(9.525, 17.4625, 0), x_dir=(-1, 0, 0), z_dir=(0, -1, 0))) as fillet1_piece_7:
        with BuildLine():
            CenterArc((4.0132 + FILLET1_R, -FILLET1_R), FILLET1_R, 90, 90)
            Line((4.0132 + FILLET1_R, 0), (4.0132, 0))
            Line((4.0132, 0), (4.0132, -FILLET1_R))
        make_face()
    revolve(axis=Axis((9.525, 17.4625, 0), (0, 0, -1)), mode=Mode.SUBTRACT)
    with BuildSketch(Plane(origin=(-9.525, 17.4625, 0), x_dir=(-1, 0, 0), z_dir=(0, -1, 0))) as fillet1_piece_8:
        with BuildLine():
            CenterArc((4.0132 + FILLET1_R, -FILLET1_R), FILLET1_R, 90, 90)
            Line((4.0132 + FILLET1_R, 0), (4.0132, 0))
            Line((4.0132, 0), (4.0132, -FILLET1_R))
        make_face()
    revolve(axis=Axis((-9.525, 17.4625, 0), (0, 0, -1)), mode=Mode.SUBTRACT)
    with BuildSketch(Plane(origin=(13.335, -25.4, 0), x_dir=(0, 0, 1), z_dir=(-1, 0, 0)), Plane(origin=(-13.335, 25.4, 0), x_dir=(0, 0, 1), z_dir=(1, 0, 0))) as fillet1_piece_9:
        with BuildLine():
            CenterArc((FILLET1_R, FILLET1_R), FILLET1_R, 180, 90)
            Line((0, FILLET1_R), (0, 0))
            Line((0, 0), (FILLET1_R, 0))
        make_face()
    extrude(amount=26.67, mode=Mode.SUBTRACT)
    with BuildSketch(Plane(origin=(-15.875, -22.86, 0), x_dir=(1, 0, 0), z_dir=(0, 1, 0)), Plane(origin=(15.875, 22.86, 0), x_dir=(-1, 0, 0), z_dir=(0, -1, 0))) as fillet1_piece_10:
        with BuildLine():
            CenterArc((FILLET1_R, -FILLET1_R), FILLET1_R, 90, 90)
            Line((0, -FILLET1_R), (0, 0))
            Line((0, 0), (FILLET1_R, 0))
        make_face()
    extrude(amount=45.72, mode=Mode.SUBTRACT)
    with BuildSketch(Plane(origin=(15.875, -25.4, 2.54), x_dir=(-1, 0, 0), z_dir=(0, 0, 1)), Plane(origin=(-15.875, 25.4, 2.54), x_dir=(1, 0, 0), z_dir=(0, 0, 1))) as fillet1_piece_11:
        with BuildLine():
            CenterArc((FILLET1_R, -FILLET1_R), FILLET1_R, 90, 90)
            Line((0, -FILLET1_R), (0, 0))
            Line((0, 0), (FILLET1_R, 0))
        make_face()
    extrude(amount=16.51, mode=Mode.SUBTRACT)
    with BuildSketch(Plane(origin=(-15.875, -25.4, 2.54), x_dir=(1, 0, 0), z_dir=(0, 0, 1)), Plane(origin=(15.875, 25.4, 2.54), x_dir=(-1, 0, 0), z_dir=(0, 0, 1))) as fillet1_piece_12:
        with BuildLine():
            CenterArc((FILLET1_R, FILLET1_R), FILLET1_R, 180, 90)
            Line((0, FILLET1_R), (0, 0))
            Line((0, 0), (FILLET1_R, 0))
        make_face()
    extrude(amount=16.51, mode=Mode.SUBTRACT)


solid = part.part
